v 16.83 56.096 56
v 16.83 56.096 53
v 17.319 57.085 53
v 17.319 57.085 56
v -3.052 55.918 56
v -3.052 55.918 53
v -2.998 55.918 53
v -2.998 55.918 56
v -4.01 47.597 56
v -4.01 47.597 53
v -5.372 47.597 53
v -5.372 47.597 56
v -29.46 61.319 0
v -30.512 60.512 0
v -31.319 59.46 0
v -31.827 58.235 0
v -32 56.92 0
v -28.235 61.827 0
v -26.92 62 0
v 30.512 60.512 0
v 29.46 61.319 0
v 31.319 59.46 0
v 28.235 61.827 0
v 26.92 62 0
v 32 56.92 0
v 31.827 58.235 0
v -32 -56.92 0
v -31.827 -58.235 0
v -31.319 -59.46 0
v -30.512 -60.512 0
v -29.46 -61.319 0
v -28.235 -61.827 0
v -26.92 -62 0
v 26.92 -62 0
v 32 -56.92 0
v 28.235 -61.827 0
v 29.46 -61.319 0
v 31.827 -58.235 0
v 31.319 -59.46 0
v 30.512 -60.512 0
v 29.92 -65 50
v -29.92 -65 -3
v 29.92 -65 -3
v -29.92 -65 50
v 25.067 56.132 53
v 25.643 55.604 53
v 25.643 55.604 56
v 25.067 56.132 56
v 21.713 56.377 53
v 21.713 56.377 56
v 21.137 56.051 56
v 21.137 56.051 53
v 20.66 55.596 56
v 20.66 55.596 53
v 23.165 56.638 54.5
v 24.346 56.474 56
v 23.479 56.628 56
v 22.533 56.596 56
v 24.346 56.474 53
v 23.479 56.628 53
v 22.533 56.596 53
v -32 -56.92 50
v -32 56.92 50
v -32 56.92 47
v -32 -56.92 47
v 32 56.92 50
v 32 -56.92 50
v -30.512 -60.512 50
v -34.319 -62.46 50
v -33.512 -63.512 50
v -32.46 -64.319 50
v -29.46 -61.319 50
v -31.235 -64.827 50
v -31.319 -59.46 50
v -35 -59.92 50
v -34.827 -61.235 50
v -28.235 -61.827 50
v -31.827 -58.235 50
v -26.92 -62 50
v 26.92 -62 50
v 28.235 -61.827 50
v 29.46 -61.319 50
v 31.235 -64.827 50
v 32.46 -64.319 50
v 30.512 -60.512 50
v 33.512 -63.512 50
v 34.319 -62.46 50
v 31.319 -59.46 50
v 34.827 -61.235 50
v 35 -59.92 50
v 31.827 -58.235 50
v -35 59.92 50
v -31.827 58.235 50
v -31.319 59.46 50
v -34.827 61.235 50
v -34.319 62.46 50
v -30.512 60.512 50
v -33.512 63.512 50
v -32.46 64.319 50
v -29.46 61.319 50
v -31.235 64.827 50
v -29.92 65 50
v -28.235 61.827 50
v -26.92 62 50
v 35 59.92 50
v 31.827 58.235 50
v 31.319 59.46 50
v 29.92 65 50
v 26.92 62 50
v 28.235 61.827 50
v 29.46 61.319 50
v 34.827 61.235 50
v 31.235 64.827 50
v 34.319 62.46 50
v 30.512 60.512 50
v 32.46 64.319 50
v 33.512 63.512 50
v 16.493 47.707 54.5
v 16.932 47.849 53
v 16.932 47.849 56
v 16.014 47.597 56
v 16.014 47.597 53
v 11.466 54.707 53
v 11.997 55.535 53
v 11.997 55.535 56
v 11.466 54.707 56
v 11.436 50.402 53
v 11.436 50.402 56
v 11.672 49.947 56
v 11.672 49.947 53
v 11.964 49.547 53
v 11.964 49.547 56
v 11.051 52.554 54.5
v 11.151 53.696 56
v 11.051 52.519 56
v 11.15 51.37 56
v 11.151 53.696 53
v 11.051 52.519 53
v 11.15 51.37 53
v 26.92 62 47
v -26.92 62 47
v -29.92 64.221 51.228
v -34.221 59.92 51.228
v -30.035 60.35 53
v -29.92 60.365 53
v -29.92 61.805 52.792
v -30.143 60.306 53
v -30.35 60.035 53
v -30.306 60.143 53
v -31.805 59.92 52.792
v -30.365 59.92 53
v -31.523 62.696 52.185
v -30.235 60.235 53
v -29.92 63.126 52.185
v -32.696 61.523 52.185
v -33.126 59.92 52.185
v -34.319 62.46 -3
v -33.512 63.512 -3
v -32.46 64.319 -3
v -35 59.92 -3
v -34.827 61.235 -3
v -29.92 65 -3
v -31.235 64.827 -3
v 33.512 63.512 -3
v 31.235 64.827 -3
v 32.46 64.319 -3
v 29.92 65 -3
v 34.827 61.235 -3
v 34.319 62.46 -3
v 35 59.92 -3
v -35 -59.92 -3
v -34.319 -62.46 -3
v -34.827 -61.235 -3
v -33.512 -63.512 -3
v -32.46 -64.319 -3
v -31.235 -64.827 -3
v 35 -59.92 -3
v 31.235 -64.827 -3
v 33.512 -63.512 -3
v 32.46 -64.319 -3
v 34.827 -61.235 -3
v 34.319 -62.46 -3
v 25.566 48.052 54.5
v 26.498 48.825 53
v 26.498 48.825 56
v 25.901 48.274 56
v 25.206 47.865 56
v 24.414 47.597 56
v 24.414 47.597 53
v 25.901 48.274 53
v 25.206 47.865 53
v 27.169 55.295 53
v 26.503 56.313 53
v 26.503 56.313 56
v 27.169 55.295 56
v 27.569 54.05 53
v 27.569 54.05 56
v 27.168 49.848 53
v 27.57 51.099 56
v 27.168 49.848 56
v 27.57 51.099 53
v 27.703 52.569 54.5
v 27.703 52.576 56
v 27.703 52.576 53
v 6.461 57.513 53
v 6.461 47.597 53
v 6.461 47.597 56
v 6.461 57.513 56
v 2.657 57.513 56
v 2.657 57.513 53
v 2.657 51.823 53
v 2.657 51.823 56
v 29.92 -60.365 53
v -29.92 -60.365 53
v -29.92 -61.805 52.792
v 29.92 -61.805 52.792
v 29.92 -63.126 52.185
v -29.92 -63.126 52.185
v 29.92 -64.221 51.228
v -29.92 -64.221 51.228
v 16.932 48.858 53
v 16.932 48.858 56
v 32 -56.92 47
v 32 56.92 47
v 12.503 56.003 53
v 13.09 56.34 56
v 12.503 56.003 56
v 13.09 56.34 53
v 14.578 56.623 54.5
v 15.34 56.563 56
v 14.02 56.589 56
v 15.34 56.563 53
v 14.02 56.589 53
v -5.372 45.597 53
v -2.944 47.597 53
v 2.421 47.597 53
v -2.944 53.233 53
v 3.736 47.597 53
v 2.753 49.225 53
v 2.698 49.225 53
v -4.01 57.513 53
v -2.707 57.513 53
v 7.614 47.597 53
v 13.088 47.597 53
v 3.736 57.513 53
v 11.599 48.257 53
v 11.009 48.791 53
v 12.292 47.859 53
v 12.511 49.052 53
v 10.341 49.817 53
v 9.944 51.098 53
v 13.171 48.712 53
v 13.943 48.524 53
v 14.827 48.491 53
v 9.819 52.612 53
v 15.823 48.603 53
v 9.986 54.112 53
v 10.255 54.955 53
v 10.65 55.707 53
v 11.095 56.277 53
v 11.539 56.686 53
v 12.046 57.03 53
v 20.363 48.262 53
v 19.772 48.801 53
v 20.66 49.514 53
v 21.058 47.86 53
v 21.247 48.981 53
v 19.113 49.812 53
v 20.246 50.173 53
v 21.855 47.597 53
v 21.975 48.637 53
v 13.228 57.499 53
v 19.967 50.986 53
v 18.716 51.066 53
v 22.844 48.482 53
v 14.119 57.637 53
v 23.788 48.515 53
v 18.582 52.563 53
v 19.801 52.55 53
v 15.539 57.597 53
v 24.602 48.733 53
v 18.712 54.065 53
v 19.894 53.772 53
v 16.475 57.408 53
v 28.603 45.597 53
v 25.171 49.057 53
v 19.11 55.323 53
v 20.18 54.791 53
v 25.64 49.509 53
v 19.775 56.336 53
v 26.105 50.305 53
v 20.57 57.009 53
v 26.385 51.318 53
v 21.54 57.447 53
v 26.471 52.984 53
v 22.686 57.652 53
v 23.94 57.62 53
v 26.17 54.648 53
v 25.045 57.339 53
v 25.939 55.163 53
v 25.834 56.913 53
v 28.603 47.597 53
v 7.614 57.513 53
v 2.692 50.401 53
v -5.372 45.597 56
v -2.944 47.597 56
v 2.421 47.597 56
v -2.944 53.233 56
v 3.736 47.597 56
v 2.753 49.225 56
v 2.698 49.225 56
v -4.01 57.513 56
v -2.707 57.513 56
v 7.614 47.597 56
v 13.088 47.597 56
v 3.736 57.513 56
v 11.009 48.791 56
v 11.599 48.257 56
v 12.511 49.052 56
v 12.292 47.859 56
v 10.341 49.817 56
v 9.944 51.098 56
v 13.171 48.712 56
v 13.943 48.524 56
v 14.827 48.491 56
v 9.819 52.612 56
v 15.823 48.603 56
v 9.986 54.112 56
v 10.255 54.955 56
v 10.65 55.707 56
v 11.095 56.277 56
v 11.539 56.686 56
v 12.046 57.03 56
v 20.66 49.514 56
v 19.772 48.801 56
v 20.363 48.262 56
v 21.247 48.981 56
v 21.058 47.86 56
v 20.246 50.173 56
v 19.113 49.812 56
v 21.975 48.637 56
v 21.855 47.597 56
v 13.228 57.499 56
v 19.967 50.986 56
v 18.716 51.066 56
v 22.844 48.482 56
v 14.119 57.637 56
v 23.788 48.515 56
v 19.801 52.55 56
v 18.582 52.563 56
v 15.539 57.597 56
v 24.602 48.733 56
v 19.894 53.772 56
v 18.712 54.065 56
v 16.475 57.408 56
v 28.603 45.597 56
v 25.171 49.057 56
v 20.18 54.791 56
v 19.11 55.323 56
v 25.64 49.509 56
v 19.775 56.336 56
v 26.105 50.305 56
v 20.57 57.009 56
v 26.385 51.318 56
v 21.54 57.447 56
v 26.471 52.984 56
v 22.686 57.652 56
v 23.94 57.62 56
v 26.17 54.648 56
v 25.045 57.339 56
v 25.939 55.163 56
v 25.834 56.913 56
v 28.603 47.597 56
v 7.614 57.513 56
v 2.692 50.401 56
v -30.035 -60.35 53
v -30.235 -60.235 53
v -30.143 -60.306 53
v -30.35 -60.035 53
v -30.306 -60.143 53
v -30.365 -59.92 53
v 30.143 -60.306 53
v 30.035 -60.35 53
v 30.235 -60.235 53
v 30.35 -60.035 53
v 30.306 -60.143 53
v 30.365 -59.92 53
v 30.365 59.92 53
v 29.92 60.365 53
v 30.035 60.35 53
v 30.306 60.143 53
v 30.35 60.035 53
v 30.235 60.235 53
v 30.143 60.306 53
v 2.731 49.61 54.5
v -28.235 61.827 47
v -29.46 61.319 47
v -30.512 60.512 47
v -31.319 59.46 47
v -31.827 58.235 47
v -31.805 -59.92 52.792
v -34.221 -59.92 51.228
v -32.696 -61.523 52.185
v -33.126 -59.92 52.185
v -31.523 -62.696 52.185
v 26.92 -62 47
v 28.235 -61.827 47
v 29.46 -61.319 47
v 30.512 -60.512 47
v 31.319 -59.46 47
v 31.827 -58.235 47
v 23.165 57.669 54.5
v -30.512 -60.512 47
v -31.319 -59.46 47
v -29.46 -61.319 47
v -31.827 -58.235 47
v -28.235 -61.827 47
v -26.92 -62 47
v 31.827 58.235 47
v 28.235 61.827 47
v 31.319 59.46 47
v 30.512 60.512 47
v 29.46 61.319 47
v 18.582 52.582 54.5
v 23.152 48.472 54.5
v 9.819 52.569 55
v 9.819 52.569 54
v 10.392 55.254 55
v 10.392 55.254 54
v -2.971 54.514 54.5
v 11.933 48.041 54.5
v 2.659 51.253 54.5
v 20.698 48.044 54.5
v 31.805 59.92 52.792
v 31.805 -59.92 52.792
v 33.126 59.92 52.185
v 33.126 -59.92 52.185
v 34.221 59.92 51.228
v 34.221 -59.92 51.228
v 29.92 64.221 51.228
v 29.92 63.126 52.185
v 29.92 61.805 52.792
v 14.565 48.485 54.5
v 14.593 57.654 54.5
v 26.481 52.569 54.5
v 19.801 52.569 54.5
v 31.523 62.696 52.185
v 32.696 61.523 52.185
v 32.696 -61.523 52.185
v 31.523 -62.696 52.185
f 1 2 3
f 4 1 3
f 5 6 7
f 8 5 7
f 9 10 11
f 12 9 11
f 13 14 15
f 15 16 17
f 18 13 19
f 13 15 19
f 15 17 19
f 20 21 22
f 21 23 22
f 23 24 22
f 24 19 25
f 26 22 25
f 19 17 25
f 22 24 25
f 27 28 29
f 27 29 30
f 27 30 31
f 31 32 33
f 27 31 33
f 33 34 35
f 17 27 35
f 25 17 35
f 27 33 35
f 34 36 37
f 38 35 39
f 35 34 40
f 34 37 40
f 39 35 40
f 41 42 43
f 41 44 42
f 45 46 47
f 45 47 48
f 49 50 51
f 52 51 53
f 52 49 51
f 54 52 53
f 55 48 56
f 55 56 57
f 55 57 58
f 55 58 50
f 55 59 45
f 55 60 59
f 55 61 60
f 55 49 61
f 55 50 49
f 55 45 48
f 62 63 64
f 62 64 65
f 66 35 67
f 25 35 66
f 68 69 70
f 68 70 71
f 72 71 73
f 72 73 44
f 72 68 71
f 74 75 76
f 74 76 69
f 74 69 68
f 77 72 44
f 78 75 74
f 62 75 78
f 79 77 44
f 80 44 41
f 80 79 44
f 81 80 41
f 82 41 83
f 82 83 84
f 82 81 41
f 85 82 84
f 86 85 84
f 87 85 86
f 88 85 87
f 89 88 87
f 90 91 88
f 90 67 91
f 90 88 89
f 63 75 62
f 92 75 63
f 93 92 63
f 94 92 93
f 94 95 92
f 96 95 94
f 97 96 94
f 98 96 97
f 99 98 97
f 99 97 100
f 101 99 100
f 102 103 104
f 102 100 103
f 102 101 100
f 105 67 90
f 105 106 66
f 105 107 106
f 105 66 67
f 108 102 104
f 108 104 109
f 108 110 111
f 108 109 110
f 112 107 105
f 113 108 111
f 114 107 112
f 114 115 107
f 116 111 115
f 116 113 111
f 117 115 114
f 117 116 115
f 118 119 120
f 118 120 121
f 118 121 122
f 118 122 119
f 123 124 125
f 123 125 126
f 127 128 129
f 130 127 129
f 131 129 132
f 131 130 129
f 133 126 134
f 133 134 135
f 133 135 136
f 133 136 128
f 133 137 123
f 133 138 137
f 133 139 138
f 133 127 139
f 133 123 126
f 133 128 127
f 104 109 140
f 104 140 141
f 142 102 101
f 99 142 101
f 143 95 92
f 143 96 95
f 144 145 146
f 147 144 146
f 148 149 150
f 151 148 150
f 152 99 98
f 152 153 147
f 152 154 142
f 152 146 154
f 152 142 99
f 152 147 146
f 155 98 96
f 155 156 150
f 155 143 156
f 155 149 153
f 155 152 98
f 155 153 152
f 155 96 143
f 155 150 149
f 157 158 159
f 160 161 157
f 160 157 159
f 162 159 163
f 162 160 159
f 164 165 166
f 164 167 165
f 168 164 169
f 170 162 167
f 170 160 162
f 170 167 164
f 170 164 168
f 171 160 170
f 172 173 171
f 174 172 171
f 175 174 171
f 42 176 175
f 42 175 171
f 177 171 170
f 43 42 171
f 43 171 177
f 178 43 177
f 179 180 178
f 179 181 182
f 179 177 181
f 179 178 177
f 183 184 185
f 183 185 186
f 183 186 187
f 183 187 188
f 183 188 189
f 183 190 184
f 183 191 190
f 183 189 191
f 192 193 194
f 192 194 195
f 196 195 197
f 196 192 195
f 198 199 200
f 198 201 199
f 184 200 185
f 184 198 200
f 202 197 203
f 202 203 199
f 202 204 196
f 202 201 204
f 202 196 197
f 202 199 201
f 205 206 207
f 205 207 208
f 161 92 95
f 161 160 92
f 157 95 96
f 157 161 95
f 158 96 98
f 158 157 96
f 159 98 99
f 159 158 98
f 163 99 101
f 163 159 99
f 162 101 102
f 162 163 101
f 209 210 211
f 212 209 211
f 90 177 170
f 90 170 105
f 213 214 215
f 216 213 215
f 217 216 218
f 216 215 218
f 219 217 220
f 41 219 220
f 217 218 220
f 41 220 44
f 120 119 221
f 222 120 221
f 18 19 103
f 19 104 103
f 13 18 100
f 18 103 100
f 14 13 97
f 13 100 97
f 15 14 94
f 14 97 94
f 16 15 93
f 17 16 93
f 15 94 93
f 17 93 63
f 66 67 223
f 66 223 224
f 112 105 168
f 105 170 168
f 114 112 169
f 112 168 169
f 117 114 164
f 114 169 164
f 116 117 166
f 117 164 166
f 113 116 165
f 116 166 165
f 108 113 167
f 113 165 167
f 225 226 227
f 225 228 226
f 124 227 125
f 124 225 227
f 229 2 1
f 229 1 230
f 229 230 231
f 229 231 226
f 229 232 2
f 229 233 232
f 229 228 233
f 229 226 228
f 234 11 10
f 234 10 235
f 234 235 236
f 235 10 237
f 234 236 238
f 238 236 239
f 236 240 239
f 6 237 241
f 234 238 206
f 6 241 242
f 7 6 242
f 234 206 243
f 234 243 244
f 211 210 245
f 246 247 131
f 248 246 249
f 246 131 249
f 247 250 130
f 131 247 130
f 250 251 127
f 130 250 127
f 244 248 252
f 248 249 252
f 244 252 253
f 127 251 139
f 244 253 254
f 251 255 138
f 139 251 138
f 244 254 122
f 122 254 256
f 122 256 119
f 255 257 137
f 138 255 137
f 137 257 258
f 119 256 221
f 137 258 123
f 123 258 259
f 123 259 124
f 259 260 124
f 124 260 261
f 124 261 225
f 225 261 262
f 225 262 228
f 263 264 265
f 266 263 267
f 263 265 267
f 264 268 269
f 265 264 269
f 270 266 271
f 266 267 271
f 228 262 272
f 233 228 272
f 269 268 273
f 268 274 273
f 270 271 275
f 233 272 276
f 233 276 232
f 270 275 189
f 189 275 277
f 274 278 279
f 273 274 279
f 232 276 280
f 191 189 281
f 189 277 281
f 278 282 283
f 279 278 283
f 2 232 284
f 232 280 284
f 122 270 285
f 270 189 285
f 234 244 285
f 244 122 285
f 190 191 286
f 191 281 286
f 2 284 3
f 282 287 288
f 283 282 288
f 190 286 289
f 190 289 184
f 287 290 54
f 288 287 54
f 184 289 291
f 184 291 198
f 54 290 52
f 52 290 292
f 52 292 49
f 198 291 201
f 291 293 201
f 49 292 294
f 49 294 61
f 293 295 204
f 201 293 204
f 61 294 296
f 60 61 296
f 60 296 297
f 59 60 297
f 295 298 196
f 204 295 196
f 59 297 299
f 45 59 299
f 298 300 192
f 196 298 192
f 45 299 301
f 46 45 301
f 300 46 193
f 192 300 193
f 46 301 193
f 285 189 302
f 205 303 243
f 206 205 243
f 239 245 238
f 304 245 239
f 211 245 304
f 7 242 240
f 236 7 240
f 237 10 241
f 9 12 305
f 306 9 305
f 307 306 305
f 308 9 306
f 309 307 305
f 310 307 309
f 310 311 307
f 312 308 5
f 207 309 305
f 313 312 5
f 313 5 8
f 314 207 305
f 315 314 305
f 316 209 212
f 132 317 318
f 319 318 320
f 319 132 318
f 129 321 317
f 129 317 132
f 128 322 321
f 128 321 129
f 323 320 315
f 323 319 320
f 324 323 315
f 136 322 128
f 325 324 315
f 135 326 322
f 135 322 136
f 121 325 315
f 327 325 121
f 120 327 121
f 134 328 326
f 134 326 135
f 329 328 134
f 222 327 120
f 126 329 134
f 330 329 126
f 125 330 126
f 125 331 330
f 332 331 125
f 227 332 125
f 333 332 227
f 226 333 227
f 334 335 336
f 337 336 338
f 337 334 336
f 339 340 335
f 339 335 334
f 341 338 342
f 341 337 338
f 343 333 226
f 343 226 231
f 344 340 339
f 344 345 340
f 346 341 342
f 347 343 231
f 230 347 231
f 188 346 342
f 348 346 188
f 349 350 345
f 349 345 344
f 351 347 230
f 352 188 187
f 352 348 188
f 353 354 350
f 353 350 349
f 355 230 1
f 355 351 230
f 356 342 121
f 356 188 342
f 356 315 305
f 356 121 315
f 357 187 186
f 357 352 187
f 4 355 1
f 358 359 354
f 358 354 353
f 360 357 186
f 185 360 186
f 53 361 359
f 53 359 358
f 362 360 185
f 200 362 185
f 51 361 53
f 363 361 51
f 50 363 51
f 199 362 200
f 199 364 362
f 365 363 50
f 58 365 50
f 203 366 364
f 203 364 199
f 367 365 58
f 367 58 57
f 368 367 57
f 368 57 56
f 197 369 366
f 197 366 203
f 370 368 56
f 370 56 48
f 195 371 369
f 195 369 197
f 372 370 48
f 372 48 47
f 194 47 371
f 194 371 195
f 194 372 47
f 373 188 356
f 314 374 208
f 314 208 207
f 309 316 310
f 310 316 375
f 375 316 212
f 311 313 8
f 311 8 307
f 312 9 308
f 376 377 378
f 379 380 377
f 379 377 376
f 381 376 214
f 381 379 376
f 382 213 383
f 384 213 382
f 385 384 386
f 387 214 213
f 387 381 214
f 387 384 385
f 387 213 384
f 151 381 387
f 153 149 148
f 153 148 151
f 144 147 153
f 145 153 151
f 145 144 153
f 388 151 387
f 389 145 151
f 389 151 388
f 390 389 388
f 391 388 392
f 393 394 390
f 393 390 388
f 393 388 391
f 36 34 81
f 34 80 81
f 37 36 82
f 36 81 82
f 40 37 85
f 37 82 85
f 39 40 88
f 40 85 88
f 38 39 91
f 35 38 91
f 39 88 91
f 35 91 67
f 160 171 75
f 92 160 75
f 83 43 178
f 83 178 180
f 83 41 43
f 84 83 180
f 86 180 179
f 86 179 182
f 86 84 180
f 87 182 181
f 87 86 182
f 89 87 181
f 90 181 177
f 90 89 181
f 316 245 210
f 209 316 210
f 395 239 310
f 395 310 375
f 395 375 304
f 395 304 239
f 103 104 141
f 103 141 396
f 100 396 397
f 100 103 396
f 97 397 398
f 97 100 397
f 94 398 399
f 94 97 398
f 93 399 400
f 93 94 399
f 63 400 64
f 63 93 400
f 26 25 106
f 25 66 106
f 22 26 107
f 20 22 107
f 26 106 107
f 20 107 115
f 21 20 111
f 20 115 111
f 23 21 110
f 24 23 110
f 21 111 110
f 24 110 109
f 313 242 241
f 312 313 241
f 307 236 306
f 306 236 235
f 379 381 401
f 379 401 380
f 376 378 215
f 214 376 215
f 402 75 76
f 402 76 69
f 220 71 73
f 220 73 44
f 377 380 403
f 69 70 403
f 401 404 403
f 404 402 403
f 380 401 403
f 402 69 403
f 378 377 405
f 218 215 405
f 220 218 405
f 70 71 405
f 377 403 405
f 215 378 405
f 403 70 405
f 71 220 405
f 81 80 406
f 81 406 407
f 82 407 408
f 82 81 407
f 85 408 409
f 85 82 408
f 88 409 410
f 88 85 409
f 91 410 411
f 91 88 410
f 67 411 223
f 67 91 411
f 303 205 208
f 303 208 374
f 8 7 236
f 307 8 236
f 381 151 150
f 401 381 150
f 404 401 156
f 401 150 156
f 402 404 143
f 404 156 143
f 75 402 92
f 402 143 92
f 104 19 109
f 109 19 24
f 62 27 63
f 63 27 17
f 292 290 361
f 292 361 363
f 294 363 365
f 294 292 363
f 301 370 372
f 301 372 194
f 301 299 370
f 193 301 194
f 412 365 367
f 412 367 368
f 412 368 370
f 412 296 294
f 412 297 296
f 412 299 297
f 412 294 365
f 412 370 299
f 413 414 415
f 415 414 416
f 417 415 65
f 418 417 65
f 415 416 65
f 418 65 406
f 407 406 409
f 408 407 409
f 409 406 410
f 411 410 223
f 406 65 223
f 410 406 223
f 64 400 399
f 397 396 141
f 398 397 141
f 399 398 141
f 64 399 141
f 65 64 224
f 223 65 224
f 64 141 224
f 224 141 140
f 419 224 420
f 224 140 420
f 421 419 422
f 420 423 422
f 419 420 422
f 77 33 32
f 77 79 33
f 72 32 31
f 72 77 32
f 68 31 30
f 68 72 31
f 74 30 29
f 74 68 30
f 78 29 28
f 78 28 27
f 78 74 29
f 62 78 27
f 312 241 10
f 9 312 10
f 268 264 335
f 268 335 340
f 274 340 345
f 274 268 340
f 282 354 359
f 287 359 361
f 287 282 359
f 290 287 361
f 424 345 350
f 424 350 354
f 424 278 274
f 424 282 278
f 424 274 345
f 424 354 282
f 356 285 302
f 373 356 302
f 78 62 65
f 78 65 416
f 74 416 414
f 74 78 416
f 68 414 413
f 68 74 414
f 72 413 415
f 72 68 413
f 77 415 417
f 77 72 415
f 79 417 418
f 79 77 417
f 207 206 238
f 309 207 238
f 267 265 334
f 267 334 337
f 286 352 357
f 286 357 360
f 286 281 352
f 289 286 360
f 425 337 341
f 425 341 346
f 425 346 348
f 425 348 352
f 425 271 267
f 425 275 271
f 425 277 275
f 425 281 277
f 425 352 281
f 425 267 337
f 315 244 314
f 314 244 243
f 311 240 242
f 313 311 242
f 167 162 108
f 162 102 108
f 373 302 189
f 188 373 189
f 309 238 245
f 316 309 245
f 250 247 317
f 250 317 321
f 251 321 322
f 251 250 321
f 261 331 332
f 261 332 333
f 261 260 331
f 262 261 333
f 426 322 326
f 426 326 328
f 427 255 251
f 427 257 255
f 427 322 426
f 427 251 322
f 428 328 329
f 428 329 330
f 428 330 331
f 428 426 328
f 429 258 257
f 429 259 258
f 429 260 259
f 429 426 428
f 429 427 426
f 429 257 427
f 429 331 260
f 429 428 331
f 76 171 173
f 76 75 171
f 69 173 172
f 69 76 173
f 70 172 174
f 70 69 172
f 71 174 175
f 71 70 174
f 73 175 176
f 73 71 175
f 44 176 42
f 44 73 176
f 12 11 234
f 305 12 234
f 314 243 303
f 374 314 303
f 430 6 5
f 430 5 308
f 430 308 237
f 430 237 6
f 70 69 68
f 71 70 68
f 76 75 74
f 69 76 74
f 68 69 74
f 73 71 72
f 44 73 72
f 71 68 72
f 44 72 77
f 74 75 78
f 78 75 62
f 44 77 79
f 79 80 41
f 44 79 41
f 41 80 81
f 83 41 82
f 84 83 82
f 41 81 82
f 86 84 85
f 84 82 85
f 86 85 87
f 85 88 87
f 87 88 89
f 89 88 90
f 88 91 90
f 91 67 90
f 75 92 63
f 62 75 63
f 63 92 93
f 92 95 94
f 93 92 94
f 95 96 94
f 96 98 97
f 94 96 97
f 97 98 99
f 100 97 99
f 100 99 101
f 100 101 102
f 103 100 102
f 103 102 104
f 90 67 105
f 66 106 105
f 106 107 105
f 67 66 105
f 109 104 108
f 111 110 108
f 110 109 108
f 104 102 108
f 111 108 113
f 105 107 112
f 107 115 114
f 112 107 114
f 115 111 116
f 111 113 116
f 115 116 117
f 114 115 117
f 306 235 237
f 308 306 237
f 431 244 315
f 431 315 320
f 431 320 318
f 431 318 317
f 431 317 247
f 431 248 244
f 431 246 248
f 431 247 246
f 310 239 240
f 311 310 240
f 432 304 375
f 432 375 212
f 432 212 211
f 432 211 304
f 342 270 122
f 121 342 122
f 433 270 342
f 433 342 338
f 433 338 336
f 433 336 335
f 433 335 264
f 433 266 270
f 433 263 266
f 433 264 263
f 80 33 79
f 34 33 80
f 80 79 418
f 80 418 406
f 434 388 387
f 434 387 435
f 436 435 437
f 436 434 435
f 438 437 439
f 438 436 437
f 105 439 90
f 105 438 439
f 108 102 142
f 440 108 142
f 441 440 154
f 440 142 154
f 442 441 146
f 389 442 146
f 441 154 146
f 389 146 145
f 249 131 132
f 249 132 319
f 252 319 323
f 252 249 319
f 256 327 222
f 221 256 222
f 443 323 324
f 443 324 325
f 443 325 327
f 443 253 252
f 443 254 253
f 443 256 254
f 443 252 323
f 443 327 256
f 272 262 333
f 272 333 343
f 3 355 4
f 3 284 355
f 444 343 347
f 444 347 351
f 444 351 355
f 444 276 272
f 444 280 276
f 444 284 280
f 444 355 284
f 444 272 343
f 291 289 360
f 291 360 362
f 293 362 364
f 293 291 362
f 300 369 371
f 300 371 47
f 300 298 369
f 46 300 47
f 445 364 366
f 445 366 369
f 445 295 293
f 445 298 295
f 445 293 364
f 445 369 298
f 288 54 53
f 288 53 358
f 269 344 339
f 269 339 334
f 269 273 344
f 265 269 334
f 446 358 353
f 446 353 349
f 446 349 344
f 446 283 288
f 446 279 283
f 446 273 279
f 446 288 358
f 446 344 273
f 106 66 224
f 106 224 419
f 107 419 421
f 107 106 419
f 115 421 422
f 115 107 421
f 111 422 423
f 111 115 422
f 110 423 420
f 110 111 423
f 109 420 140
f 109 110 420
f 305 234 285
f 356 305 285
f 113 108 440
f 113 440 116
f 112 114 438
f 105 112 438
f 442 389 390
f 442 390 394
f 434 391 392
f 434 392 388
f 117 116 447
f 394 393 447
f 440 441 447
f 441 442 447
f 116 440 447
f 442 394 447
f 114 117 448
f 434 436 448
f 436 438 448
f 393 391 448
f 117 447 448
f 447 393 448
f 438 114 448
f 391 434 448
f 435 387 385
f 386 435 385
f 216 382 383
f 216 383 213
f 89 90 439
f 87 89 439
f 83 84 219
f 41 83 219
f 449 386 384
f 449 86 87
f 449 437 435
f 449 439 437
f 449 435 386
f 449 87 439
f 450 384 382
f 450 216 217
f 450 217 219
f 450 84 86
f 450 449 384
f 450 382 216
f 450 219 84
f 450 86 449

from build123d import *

# Parameters (mm, degrees)
F0_W          = 70
F0_H          = 130
F0_W_2        = 64
F0_H_2        = 124
F1_DEPTH      = 50
F2_W          = 70
F2_H          = 3
F3_DEPTH      = 130
F4_R          = 5.08
F5_R          = 5.08
F7_DEPTH      = 3
F8_W          = 70
F8_H          = 130
F9_DEPTH      = 3
F10_R         = 5.08
F11_W         = 1.15234375
F11_H         = 9.9153645833
F12_DEPTH     = 3
F13_T1_DEPTH  = 59.84
F13_T3_DEPTH  = 119.84
F13_T6_ANGLE  = 90
F13_T8_ANGLE  = 90
F13_T10_ANGLE = 90
F13_T12_ANGLE = 90


# Not quite as in the source:
# - a fillet or chamfer that OpenCascade refuses, or shapes differently, is made with other operations: its cross-section is extruded or revolved along the edge and cut away or added


with BuildPart() as f1:
    # F0 (on Top) → F1 (new body)
    with BuildSketch(Plane.XY):
        Rectangle(F0_W, F0_H)
        Rectangle(F0_W_2, F0_H_2, mode=Mode.SUBTRACT)
    extrude(amount=F1_DEPTH)

    # F2 (on face) → F3 (join, through all)
    with BuildSketch(Plane.XZ.offset(65)):
        with Locations((0, -1.5)):
            Rectangle(F2_W, F2_H)
    extrude(amount=-F3_DEPTH)

    # F4
    f4_edges = [f1.edges().sort_by_distance(p)[0] for p in [
        (35, 65, 23.5),
        (-35, 65, 23.5),
        (-35, -65, 23.5),
        (35, -65, 23.5),
    ]]
    fillet(f4_edges, radius=F4_R)

    # F5
    f5_edges = [f1.edges().sort_by_distance(p)[0] for p in [
        (-32, -62, 25),
        (-32, 62, 25),
        (32, 62, 25),
        (32, -62, 25),
    ]]
    fillet(f5_edges, radius=F5_R)


with BuildPart() as f7:
    # F6 (on face) → F7 (new body)
    with BuildSketch(Plane.XY.offset(50)):
        with BuildLine():
            Line((26.92, 62), (-26.92, 62))
            ThreePointArc((-26.92, 62), (-30.5121024484, 60.5121024484), (-32, 56.92))
            Line((-32, 56.92), (-32, -56.92))
            ThreePointArc((-32, -56.92), (-30.5121024484, -60.5121024484), (-26.92, -62))
            Line((-26.92, -62), (26.92, -62))
            ThreePointArc((26.92, -62), (30.5121024484, -60.5121024484), (32, -56.92))
            Line((32, -56.92), (32, 56.92))
            ThreePointArc((32, 56.92), (30.5121024484, 60.5121024484), (26.92, 62))
        make_face()
    extrude(amount=-F7_DEPTH)

    # F8 (on face) → F9 (join)
    with BuildSketch(Plane.XY.offset(50)):
        Rectangle(F8_W, F8_H)
    extrude(amount=F9_DEPTH)

    # F10
    f10_edges = [f7.edges().sort_by_distance(p)[0] for p in [
        (-35, 65, 51.5),
        (-35, -65, 51.5),
        (35, -65, 51.5),
        (35, 65, 51.5),
    ]]
    fillet(f10_edges, radius=F10_R)

    # F13: fillet of radius 5.08 on 1 edges, made by hand

    # F13_s2 → F13_t1 (cut)
    with BuildSketch(Plane.YZ.offset(-29.92)):
        with BuildLine():
            ThreePointArc((-60.3653479095, 53), (-63.1257826579, 52.1845515591), (-65, 50))
            Line((-65, 50), (-65, 53))
            Line((-65, 53), (-60.3653479095, 53))
        make_face()
        with BuildLine():
            ThreePointArc((65, 50), (63.1257826579, 52.1845515591), (60.3653479095, 53))
            Line((60.3653479095, 53), (65, 53))
            Line((65, 53), (65, 50))
        make_face()
    extrude(amount=F13_T1_DEPTH, mode=Mode.SUBTRACT)

    # F13_s4 → F13_t3 (cut)
    with BuildSketch(Plane.XZ.offset(-59.92)):
        with BuildLine():
            ThreePointArc((30.3653479095, 53), (33.1257826579, 52.1845515591), (35, 50))
            Line((35, 50), (35, 53))
            Line((35, 53), (30.3653479095, 53))
        make_face()
        with BuildLine():
            ThreePointArc((-30.3653479095, 53), (-33.1257826579, 52.1845515591), (-35, 50))
            Line((-35, 50), (-35, 53))
            Line((-35, 53), (-30.3653479095, 53))
        make_face()
    extrude(amount=F13_T3_DEPTH, mode=Mode.SUBTRACT)

    # F13_s5 → F13_t6 (revolve, cut)
    with BuildSketch(Plane.XZ.offset(59.92)):
        with BuildLine():
            ThreePointArc((-30.3653479095, 53), (-33.1257826579, 52.1845515591), (-35, 50))
            Line((-35, 50), (-35, 53))
            Line((-35, 53), (-30.3653479095, 53))
        make_face()
    revolve(axis=Axis((-29.92, -59.92, 53), (0, 0, 1)), revolution_arc=F13_T6_ANGLE, mode=Mode.SUBTRACT)

    # F13_s7 → F13_t8 (revolve, cut)
    with BuildSketch(Plane.XZ.offset(59.92)):
        with BuildLine():
            ThreePointArc((30.3653479095, 53), (33.1257826579, 52.1845515591), (35, 50))
            Line((35, 50), (35, 53))
            Line((35, 53), (30.3653479095, 53))
        make_face()
    revolve(axis=Axis((29.92, -59.92, 53), (0, 0, -1)), revolution_arc=F13_T8_ANGLE, mode=Mode.SUBTRACT)

    # F13_s9 → F13_t10 (revolve, cut)
    with BuildSketch(Plane.YZ.offset(29.92)):
        with BuildLine():
            ThreePointArc((65, 50), (63.1257826579, 52.1845515591), (60.3653479095, 53))
            Line((60.3653479095, 53), (65, 53))
            Line((65, 53), (65, 50))
        make_face()
    revolve(axis=Axis((29.92, 59.92, 53), (0, 0, -1)), revolution_arc=F13_T10_ANGLE, mode=Mode.SUBTRACT)

    # F13_s11 → F13_t12 (revolve, cut)
    with BuildSketch(Plane.YZ.offset(-29.92)):
        with BuildLine():
            ThreePointArc((65, 50), (63.1257826579, 52.1845515591), (60.3653479095, 53))
            Line((60.3653479095, 53), (65, 53))
            Line((65, 53), (65, 50))
        make_face()
    revolve(axis=Axis((-29.92, 59.92, 53), (0, 0, 1)), revolution_arc=F13_T12_ANGLE, mode=Mode.SUBTRACT)


with BuildPart() as f12:
    # F11 (on face) → F12 (new body)
    with BuildSketch(Plane.XY.offset(53)):
        with BuildLine():
            Line((-4.0095031147, 47.5973086248), (-5.3723503369, 47.5973086248))
            Line((-5.3723503369, 47.5973086248), (-5.3723503369, 45.5973086248))
            Line((-5.3723503369, 45.5973086248), (28.6033441075, 45.5973086248))
            Line((28.6033441075, 45.5973086248), (28.6033441075, 47.5973086248))
            Line((28.6033441075, 47.5973086248), (24.414270697, 47.5973086248))
            add(Edge.make_bspline(
                [(24.414270697, 47.5973086248), (23.8300998313, 47.4605898748), (23.1519552187, 47.4605898748)],
                knots=[0.6833950988, 0.6833950988, 0.6833950988, 1, 1, 1], degree=2))
            add(Edge.make_bspline(
                [(23.1519552187, 47.4605898748), (22.4525473893, 47.4605898748), (21.8550974295, 47.5973086248)],
                knots=[0, 0, 0, 0.319412416, 0.319412416, 0.319412416], degree=2))
            Line((21.8550974295, 47.5973086248), (16.0140816741, 47.5973086248))
            add(Edge.make_bspline(
                [(16.0140816741, 47.5973086248), (15.2862889306, 47.4605898748), (14.3889343853, 47.4605898748)],
                knots=[0.406741787, 0.406741787, 0.406741787, 1, 1, 1], degree=2))
            add(Edge.make_bspline(
                [(14.3889343853, 47.4605898748), (13.6869640925, 47.4605898748), (13.0877001364, 47.5973086248)],
                knots=[0, 0, 0, 0.3205826669, 0.3205826669, 0.3205826669], degree=2))
            Line((13.0877001364, 47.5973086248), (7.6137607742, 47.5973086248))
            Line((7.6137607742, 47.5973086248), (6.4614170242, 47.5973086248))
            Line((6.4614170242, 47.5973086248), (3.7357225798, 47.5973086248))
            Line((3.7357225798, 47.5973086248), (2.4206184131, 47.5973086248))
            Line((2.4206184131, 47.5973086248), (-2.9439649202, 47.5973086248))
            Line((-2.9439649202, 47.5973086248), (-4.0095031147, 47.5973086248))
        make_face()
        with BuildLine():
            Line((-4.0095031147, 57.5126732081), (-4.0095031147, 47.5973086248))
            Line((-4.0095031147, 47.5973086248), (-2.9439649202, 47.5973086248))
            Line((-2.9439649202, 47.5973086248), (-2.9439649202, 53.2331593192))
            add(Edge.make_bspline(
                [(-3.0524718647, 55.9176211248), (-2.9439649202, 54.4527773748), (-2.9439649202, 53.2331593192)],
                knots=[0, 0, 0, 1, 1, 1], degree=2))
            Line((-3.0524718647, 55.9176211248), (-2.9982183925, 55.9176211248))
            Line((-2.9982183925, 55.9176211248), (2.4206184131, 47.5973086248))
            Line((2.4206184131, 47.5973086248), (3.7357225798, 47.5973086248))
            Line((3.7357225798, 47.5973086248), (3.7357225798, 57.5126732081))
            Line((3.7357225798, 57.5126732081), (2.657163552, 57.5126732081))
            Line((2.657163552, 57.5126732081), (2.657163552, 51.8225690414))
            add(Edge.make_bspline(
                [(2.6918857742, 50.4011280692), (2.6441427187, 51.3950516803), (2.657163552, 51.8225690414)],
                knots=[0, 0, 0, 1, 1, 1], degree=2))
            add(Edge.make_bspline(
                [(2.7526496631, 49.2249127914), (2.7396288298, 49.4072044581), (2.6918857742, 50.4011280692)],
                knots=[0, 0, 0, 1, 1, 1], degree=2))
            Line((2.7526496631, 49.2249127914), (2.6983961909, 49.2249127914))
            Line((2.6983961909, 49.2249127914), (-2.7074197813, 57.5126732081))
            Line((-2.7074197813, 57.5126732081), (-4.0095031147, 57.5126732081))
        make_face()
        with BuildLine():
            add(Edge.make_bspline(
                [(24.414270697, 47.5973086248), (23.8300998313, 47.4605898748), (23.1519552187, 47.4605898748)],
                knots=[0.6833950988, 0.6833950988, 0.6833950988, 1, 1, 1], degree=2))
            Line((24.414270697, 47.5973086248), (21.8550974295, 47.5973086248))
            add(Edge.make_bspline(
                [(23.1519552187, 47.4605898748), (22.4525473893, 47.4605898748), (21.8550974295, 47.5973086248)],
                knots=[0, 0, 0, 0.319412416, 0.319412416, 0.319412416], degree=2))
        make_face()
        with BuildLine():
            Line((21.8550974295, 47.5973086248), (24.414270697, 47.5973086248))
            add(Edge.make_bspline(
                [(26.4983093853, 48.8245221664), (25.6752098198, 47.8924175233), (24.414270697, 47.5973086248)],
                knots=[0, 0, 0, 0.6833950988, 0.6833950988, 0.6833950988], degree=2))
            add(Edge.make_bspline(
                [(27.7027364687, 52.5690968192), (27.7027364687, 50.1884544581), (26.4983093853, 48.8245221664)],
                knots=[0, 0, 0, 1, 1, 1], degree=2))
            add(Edge.make_bspline(
                [(26.5026496631, 56.3125864026), (27.7027364687, 54.956249597), (27.7027364687, 52.5690968192)],
                knots=[0, 0, 0, 1, 1, 1], degree=2))
            add(Edge.make_bspline(
                [(23.164976052, 57.6689232081), (25.3025628575, 57.6689232081), (26.5026496631, 56.3125864026)],
                knots=[0, 0, 0, 1, 1, 1], degree=2))
            add(Edge.make_bspline(
                [(19.7752191075, 56.3364579303), (20.9687954964, 57.6689232081), (23.164976052, 57.6689232081)],
                knots=[0, 0, 0, 1, 1, 1], degree=2))
            add(Edge.make_bspline(
                [(18.5816427187, 52.5821176526), (18.5816427187, 55.0039926526), (19.7752191075, 56.3364579303)],
                knots=[0, 0, 0, 1, 1, 1], degree=2))
            add(Edge.make_bspline(
                [(19.7719638992, 48.8006506387), (18.5816427187, 50.1407114026), (18.5816427187, 52.5821176526)],
                knots=[0, 0, 0, 1, 1, 1], degree=2))
            add(Edge.make_bspline(
                [(21.8550974295, 47.5973086248), (20.5820817157, 47.888621921), (19.7719638992, 48.8006506387)],
                knots=[0.319412416, 0.319412416, 0.319412416, 1, 1, 1], degree=2))
        make_face()
        with BuildLine():
            add(Edge.make_bspline(
                [(19.8012607742, 52.5690968192), (19.8012607742, 50.5552079303), (20.6595507048, 49.5135412637)],
                knots=[0, 0, 0, 1, 1, 1], degree=2))
            add(Edge.make_bspline(
                [(20.6595507048, 55.5964405692), (19.8012607742, 54.5547739026), (19.8012607742, 52.5690968192)],
                knots=[0, 0, 0, 1, 1, 1], degree=2))
            add(Edge.make_bspline(
                [(23.164976052, 56.6381072359), (21.5178406353, 56.6381072359), (20.6595507048, 55.5964405692)],
                knots=[0, 0, 0, 1, 1, 1], degree=2))
            add(Edge.make_bspline(
                [(25.6432746631, 55.6040360553), (24.805601052, 56.6381072359), (23.164976052, 56.6381072359)],
                knots=[0, 0, 0, 1, 1, 1], degree=2))
            add(Edge.make_bspline(
                [(26.4809482742, 52.5690968192), (26.4809482742, 54.5699648748), (25.6432746631, 55.6040360553)],
                knots=[0, 0, 0, 1, 1, 1], degree=2))
            add(Edge.make_bspline(
                [(25.6400194548, 49.5092009859), (26.4809482742, 50.5465273748), (26.4809482742, 52.5690968192)],
                knots=[0, 0, 0, 1, 1, 1], degree=2))
            add(Edge.make_bspline(
                [(23.1519552187, 48.471874597), (24.7990906353, 48.471874597), (25.6400194548, 49.5092009859)],
                knots=[0, 0, 0, 1, 1, 1], degree=2))
            add(Edge.make_bspline(
                [(20.6595507048, 49.5135412637), (21.5178406353, 48.471874597), (23.1519552187, 48.471874597)],
                knots=[0, 0, 0, 1, 1, 1], degree=2))
        make_face(mode=Mode.SUBTRACT)
        with Locations((7.0375888992, 52.5549909164)):
            Rectangle(F11_W, F11_H)
        with BuildLine():
            add(Edge.make_bspline(
                [(16.0140816741, 47.5973086248), (15.2862889306, 47.4605898748), (14.3889343853, 47.4605898748)],
                knots=[0.406741787, 0.406741787, 0.406741787, 1, 1, 1], degree=2))
            Line((16.0140816741, 47.5973086248), (13.0877001364, 47.5973086248))
            add(Edge.make_bspline(
                [(14.3889343853, 47.4605898748), (13.6869640925, 47.4605898748), (13.0877001364, 47.5973086248)],
                knots=[0, 0, 0, 0.3205826669, 0.3205826669, 0.3205826669], degree=2))
        make_face()
        with BuildLine():
            Line((13.0877001364, 47.5973086248), (16.0140816741, 47.5973086248))
            add(Edge.make_bspline(
                [(16.9323371631, 47.8490447359), (16.5130612325, 47.6910439115), (16.0140816741, 47.5973086248)],
                knots=[0, 0, 0, 0.406741787, 0.406741787, 0.406741787], degree=2))
            Line((16.9323371631, 47.8490447359), (16.9323371631, 48.8581593192))
            add(Edge.make_bspline(
                [(14.5647156353, 48.4848954303), (15.6020420242, 48.4848954303), (16.9323371631, 48.8581593192)],
                knots=[0, 0, 0, 1, 1, 1], degree=2))
            add(Edge.make_bspline(
                [(11.963804177, 49.5471784164), (12.8763475798, 48.4848954303), (14.5647156353, 48.4848954303)],
                knots=[0, 0, 0, 1, 1, 1], degree=2))
            add(Edge.make_bspline(
                [(11.0512607742, 52.553905847), (11.0512607742, 50.6094614026), (11.963804177, 49.5471784164)],
                knots=[0, 0, 0, 1, 1, 1], degree=2))
            add(Edge.make_bspline(
                [(11.9974413298, 55.5345916109), (11.0512607742, 54.4462669581), (11.0512607742, 52.553905847)],
                knots=[0, 0, 0, 1, 1, 1], degree=2))
            add(Edge.make_bspline(
                [(14.5777364687, 56.6229162637), (12.9436218853, 56.6229162637), (11.9974413298, 55.5345916109)],
                knots=[0, 0, 0, 1, 1, 1], degree=2))
            add(Edge.make_bspline(
                [(16.8303406353, 56.0955725137), (15.704038552, 56.6229162637), (14.5777364687, 56.6229162637)],
                knots=[0, 0, 0, 1, 1, 1], degree=2))
            Line((16.8303406353, 56.0955725137), (17.3186218853, 57.085155847))
            add(Edge.make_bspline(
                [(14.5929274409, 57.6537322359), (16.1510871631, 57.6537322359), (17.3186218853, 57.085155847)],
                knots=[0, 0, 0, 1, 1, 1], degree=2))
            add(Edge.make_bspline(
                [(12.0462694548, 57.0298173053), (13.1280836909, 57.6537322359), (14.5929274409, 57.6537322359)],
                knots=[0, 0, 0, 1, 1, 1], degree=2))
            add(Edge.make_bspline(
                [(10.391538552, 55.2535586248), (10.9644552187, 56.4059023748), (12.0462694548, 57.0298173053)],
                knots=[0, 0, 0, 1, 1, 1], degree=2))
            add(Edge.make_bspline(
                [(9.8186218853, 52.5690968192), (9.8186218853, 54.1012148748), (10.391538552, 55.2535586248)],
                knots=[0, 0, 0, 1, 1, 1], degree=2))
            add(Edge.make_bspline(
                [(11.0089430659, 48.7908850137), (9.8186218853, 50.1211801526), (9.8186218853, 52.5690968192)],
                knots=[0, 0, 0, 1, 1, 1], degree=2))
            add(Edge.make_bspline(
                [(13.0877001364, 47.5973086248), (11.8176679079, 47.8870594382), (11.0089430659, 48.7908850137)],
                knots=[0.3205826669, 0.3205826669, 0.3205826669, 1, 1, 1], degree=2))
        make_face()
    extrude(amount=F12_DEPTH)


solid = Compound([f1.part, f7.part, f12.part])
